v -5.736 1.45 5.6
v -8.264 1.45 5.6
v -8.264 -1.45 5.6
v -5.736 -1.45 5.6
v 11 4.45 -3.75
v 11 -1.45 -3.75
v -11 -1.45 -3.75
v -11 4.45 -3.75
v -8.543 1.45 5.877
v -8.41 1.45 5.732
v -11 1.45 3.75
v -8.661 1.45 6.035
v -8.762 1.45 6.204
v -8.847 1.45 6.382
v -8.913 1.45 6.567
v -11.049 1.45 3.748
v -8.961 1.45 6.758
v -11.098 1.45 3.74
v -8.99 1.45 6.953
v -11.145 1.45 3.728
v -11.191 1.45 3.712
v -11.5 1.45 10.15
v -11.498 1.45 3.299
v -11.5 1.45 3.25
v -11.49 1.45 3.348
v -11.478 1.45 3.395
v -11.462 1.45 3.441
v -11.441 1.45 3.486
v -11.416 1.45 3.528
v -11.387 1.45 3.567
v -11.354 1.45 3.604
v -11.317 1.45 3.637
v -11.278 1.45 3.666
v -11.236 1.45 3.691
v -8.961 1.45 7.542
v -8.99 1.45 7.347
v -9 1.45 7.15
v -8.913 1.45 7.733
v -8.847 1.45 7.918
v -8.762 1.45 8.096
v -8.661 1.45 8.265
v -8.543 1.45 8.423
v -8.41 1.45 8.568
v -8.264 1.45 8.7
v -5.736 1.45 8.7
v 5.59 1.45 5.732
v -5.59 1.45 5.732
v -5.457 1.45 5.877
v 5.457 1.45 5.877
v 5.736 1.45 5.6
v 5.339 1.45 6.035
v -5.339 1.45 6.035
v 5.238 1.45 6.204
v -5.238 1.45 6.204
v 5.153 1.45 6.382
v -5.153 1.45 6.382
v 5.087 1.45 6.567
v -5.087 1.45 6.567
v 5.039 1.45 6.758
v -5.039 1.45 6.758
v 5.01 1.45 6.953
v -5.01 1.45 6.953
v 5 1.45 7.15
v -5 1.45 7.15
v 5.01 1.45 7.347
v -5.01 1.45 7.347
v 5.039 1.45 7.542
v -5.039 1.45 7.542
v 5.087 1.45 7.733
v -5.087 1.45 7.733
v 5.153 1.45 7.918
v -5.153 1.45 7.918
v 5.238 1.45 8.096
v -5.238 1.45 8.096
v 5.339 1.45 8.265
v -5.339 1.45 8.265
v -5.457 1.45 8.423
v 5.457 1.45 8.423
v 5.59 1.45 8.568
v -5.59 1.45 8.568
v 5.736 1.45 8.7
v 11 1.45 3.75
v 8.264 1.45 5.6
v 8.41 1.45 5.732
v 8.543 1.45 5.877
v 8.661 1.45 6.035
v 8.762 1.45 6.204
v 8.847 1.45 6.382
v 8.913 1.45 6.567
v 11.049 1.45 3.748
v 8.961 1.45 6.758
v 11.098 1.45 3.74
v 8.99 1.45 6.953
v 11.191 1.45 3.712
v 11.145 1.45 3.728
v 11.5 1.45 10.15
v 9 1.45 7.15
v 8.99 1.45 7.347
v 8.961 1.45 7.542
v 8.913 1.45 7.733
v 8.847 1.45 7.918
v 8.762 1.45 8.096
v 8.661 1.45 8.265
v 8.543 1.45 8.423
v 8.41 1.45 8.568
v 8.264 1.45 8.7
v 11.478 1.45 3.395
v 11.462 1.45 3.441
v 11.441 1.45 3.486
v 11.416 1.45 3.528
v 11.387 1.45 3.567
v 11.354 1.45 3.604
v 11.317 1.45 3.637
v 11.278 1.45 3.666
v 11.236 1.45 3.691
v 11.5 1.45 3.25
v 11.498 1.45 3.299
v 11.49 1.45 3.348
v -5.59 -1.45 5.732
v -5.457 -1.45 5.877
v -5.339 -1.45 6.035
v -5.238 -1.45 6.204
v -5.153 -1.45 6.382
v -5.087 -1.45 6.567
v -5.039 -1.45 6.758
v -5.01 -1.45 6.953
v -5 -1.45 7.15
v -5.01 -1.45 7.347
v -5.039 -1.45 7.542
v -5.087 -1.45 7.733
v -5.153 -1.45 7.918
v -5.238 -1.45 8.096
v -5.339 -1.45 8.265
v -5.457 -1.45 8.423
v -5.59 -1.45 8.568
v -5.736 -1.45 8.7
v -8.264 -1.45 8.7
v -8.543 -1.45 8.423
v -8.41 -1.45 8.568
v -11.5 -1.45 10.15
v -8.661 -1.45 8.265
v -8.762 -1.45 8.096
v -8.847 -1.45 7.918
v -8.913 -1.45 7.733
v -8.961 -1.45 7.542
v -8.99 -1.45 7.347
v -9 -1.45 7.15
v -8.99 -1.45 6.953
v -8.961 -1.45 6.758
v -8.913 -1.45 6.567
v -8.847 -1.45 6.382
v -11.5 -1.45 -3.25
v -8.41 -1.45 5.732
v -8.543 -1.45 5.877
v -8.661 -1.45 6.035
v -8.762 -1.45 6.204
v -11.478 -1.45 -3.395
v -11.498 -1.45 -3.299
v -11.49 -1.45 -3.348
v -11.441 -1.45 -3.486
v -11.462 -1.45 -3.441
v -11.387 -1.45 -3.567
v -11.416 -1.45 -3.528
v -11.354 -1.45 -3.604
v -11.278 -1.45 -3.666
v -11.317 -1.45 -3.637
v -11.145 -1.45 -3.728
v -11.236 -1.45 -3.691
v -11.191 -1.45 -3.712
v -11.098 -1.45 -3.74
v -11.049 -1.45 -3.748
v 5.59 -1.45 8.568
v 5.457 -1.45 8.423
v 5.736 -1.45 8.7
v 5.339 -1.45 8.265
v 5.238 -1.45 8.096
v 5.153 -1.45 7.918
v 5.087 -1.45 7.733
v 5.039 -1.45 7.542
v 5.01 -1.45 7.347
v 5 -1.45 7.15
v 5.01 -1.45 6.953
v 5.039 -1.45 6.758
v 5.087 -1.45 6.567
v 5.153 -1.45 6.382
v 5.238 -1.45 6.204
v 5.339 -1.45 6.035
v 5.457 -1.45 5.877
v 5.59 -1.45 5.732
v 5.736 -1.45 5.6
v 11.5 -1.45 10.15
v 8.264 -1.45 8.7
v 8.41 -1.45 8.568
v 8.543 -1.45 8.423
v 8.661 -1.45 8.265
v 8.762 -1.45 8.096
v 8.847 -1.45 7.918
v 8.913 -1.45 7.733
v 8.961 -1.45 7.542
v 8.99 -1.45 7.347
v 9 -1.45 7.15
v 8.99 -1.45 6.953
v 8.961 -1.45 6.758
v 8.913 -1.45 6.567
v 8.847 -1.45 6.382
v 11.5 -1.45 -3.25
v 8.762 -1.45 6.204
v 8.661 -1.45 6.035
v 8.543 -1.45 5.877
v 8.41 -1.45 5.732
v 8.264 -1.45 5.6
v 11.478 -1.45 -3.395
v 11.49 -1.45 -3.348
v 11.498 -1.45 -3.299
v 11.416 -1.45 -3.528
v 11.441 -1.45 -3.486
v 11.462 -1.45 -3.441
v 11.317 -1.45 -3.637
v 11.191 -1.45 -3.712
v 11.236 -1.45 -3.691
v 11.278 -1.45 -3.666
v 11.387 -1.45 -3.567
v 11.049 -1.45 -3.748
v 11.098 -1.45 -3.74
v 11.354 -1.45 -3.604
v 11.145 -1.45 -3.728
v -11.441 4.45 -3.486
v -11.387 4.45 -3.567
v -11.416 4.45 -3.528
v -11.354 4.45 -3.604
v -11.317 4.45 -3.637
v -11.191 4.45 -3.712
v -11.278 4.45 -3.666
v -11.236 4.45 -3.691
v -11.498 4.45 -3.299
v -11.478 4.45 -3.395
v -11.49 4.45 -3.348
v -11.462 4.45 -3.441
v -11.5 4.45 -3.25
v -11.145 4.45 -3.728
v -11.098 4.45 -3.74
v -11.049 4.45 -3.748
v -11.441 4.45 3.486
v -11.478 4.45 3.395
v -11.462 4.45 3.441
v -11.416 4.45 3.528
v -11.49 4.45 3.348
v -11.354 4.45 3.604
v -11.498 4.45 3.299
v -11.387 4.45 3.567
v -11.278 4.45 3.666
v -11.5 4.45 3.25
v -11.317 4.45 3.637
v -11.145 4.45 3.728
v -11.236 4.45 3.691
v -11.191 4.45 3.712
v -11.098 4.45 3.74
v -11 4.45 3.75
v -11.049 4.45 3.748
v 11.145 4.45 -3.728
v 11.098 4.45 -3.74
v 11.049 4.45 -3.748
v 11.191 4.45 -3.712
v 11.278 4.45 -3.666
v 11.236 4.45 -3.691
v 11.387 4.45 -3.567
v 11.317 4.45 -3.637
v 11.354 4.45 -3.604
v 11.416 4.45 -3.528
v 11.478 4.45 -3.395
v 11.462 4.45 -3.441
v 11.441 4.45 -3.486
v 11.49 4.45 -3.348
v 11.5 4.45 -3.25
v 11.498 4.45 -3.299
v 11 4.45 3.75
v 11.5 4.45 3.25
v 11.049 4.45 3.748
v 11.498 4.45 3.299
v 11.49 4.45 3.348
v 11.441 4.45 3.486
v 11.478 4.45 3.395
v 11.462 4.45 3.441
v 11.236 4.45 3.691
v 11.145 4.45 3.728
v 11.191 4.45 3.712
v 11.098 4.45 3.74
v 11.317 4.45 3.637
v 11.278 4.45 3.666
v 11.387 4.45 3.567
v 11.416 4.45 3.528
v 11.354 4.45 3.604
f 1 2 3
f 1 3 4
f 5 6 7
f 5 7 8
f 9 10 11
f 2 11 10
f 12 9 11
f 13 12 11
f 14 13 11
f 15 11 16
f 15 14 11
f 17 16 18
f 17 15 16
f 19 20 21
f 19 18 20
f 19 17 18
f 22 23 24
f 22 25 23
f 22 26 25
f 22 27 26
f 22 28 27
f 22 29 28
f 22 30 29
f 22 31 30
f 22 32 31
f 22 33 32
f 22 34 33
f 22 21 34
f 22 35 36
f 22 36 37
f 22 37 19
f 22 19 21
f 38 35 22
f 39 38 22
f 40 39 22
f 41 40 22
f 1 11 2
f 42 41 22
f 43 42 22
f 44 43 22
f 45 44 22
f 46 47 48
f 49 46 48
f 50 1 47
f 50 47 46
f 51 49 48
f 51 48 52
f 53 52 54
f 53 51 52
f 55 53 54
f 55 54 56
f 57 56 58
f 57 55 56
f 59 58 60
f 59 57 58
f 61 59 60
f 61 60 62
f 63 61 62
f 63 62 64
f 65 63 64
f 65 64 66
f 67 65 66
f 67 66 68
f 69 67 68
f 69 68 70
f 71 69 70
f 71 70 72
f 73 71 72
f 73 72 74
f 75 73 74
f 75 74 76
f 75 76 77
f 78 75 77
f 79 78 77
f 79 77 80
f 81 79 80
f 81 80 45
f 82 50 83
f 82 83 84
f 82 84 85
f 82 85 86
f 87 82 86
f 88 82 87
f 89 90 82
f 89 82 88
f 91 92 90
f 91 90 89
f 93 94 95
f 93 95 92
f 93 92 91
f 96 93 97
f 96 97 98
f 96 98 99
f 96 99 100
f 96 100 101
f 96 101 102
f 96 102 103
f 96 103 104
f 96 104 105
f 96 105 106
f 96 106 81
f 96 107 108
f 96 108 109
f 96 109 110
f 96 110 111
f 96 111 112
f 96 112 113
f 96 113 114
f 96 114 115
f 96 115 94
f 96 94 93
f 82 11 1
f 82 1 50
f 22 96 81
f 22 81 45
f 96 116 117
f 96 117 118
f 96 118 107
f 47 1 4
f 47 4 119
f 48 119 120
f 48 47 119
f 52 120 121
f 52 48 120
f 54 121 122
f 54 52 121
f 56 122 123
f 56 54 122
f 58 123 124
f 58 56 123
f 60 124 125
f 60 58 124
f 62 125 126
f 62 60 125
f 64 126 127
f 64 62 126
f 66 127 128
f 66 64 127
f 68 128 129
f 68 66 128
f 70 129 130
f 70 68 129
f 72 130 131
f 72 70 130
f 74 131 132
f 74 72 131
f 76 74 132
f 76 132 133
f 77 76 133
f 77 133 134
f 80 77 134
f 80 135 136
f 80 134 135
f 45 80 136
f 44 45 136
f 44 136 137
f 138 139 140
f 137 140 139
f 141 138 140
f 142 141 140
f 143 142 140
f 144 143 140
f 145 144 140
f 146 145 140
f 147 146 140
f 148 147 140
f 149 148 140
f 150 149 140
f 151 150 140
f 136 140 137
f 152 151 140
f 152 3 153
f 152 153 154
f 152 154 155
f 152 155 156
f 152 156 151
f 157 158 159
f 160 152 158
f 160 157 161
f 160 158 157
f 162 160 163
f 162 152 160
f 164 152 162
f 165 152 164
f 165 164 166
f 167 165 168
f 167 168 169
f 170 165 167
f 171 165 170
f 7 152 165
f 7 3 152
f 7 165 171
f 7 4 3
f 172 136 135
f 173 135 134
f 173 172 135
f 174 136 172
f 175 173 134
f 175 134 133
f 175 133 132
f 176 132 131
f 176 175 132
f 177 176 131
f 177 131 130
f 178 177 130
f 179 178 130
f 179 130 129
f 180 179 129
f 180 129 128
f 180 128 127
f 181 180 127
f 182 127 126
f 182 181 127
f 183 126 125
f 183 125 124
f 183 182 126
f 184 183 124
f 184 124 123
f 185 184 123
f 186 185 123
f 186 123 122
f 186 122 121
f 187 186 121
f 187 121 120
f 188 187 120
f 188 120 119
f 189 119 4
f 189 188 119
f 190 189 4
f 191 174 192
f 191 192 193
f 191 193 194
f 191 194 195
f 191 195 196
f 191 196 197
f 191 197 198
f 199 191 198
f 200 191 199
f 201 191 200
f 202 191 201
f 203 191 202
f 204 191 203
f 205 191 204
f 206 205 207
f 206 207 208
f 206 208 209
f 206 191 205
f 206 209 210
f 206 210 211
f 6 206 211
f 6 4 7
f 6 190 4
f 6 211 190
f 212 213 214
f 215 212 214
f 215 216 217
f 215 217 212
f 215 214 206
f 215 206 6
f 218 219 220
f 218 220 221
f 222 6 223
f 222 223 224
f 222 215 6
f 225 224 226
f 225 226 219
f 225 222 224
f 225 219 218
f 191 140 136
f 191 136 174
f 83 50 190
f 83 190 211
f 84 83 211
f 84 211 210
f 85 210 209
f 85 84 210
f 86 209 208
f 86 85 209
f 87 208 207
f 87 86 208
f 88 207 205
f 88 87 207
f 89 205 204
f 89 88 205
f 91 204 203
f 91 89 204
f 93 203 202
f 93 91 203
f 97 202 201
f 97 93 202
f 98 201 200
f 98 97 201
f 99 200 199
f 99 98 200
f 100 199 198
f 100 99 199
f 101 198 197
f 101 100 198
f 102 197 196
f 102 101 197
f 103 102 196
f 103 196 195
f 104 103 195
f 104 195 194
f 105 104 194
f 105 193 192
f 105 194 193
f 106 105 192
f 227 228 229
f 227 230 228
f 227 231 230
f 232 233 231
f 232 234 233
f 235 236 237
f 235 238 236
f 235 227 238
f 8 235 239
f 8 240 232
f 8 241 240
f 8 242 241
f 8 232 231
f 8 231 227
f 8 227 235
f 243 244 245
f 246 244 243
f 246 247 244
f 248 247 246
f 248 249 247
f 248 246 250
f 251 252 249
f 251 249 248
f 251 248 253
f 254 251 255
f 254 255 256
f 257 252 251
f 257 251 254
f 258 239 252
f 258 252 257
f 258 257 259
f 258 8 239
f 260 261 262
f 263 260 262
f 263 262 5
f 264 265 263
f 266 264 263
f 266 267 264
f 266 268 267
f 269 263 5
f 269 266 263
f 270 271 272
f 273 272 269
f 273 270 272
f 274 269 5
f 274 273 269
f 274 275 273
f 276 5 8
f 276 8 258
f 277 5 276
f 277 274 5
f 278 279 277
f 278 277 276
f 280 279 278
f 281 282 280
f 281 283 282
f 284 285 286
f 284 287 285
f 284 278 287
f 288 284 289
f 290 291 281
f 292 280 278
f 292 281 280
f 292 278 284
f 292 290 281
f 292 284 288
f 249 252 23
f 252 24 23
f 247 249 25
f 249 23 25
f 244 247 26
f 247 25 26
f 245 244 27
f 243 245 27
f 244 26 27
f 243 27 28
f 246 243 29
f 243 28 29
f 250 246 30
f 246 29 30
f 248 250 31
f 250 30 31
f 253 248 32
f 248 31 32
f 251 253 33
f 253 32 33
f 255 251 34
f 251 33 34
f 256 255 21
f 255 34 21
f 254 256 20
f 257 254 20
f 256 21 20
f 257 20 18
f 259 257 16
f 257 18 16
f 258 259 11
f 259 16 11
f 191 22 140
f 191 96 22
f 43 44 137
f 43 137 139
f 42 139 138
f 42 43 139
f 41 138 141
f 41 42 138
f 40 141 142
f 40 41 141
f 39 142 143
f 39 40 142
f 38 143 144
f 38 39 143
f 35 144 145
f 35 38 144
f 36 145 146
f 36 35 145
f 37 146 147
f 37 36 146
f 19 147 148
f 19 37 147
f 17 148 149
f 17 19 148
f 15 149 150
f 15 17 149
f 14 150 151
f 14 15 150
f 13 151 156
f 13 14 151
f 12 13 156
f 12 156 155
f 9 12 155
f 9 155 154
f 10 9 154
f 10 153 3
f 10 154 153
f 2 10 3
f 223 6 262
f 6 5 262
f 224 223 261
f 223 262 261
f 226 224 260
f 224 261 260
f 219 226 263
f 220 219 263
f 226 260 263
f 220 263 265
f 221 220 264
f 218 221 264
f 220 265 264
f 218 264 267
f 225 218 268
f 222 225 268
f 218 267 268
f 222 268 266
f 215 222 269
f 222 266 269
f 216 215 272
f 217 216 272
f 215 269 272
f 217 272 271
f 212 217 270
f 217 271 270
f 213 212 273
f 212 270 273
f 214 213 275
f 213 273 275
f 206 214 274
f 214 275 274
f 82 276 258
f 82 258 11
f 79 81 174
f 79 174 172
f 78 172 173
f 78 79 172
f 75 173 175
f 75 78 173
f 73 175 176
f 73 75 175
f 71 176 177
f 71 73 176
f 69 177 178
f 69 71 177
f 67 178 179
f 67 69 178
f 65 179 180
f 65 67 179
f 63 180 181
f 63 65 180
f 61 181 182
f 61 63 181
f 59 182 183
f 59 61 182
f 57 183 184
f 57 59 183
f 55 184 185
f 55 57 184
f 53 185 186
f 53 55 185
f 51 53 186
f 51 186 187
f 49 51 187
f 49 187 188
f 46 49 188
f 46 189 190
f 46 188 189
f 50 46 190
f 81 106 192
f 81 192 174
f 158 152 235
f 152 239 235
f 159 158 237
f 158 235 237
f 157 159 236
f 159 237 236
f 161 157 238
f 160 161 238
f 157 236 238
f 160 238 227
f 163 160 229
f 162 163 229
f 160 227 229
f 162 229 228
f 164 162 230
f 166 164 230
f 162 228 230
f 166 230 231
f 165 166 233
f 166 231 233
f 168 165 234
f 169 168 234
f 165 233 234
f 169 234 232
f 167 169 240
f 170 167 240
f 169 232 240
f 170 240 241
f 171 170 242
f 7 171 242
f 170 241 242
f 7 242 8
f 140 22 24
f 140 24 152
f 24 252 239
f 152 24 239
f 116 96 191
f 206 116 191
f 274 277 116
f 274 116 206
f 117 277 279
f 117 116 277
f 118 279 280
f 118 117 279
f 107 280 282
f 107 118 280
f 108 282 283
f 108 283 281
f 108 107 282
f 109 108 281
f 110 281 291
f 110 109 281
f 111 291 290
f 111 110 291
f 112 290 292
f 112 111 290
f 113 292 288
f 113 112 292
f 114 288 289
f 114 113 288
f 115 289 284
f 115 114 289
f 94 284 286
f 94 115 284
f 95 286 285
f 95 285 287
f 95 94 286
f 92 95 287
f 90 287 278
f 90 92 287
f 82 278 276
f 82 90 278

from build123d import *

# Parameters (mm, degrees)
BOSS_EXTRUDE1_DEPTH = 11.5
CUT_EXTRUDE1_DEPTH  = 16.62921943
FILLET1_R           = 0.5


with BuildPart() as part:
    # Sketch1 → Boss-Extrude1 (new, symmetric)
    with BuildSketch(Plane(origin=(0, 0, 0), x_dir=(0, 0, -1), z_dir=(1, 0, 0))):
        Polygon((-10.15, -1.45), (3.75, -1.45), (3.75, 4.45), (-3.75, 4.45), (-3.75, 1.45), (-10.15, 1.45), align=None)
    extrude(amount=BOSS_EXTRUDE1_DEPTH, both=True)

    # Sketch2 → Cut-Extrude1 (cut, through all)
    with BuildSketch(Plane(origin=(0, 1.45, 0), x_dir=(1, 0, 0), z_dir=(0, 1, 0))):
        with BuildLine():
            Line((-8.263922466, -5.6), (-5.736077534, -5.6))
            ThreePointArc((-5.736077534, -5.6), (-5, -7.15), (-5.736077534, -8.7))
            Line((-5.736077534, -8.7), (-8.263922466, -8.7))
            ThreePointArc((-8.263922466, -8.7), (-9, -7.15), (-8.263922466, -5.6))
        make_face()
        with BuildLine():
            Line((5.736077534, -5.6), (8.263922466, -5.6))
            ThreePointArc((8.263922466, -5.6), (9, -7.15), (8.263922466, -8.7))
            Line((8.263922466, -8.7), (5.736077534, -8.7))
            ThreePointArc((5.736077534, -8.7), (5, -7.15), (5.736077534, -5.6))
        make_face()
    extrude(amount=-CUT_EXTRUDE1_DEPTH, mode=Mode.SUBTRACT)

    # Fillet1
    fillet1_edges = [part.edges().sort_by_distance(p)[0] for p in [
        (11.5, 1.5, -3.75),
        (11.5, 2.95, 3.75),
        (-11.5, 2.95, 3.75),
        (-11.5, 1.5, -3.75),
    ]]
    fillet(fillet1_edges, radius=FILLET1_R)


solid = part.part
